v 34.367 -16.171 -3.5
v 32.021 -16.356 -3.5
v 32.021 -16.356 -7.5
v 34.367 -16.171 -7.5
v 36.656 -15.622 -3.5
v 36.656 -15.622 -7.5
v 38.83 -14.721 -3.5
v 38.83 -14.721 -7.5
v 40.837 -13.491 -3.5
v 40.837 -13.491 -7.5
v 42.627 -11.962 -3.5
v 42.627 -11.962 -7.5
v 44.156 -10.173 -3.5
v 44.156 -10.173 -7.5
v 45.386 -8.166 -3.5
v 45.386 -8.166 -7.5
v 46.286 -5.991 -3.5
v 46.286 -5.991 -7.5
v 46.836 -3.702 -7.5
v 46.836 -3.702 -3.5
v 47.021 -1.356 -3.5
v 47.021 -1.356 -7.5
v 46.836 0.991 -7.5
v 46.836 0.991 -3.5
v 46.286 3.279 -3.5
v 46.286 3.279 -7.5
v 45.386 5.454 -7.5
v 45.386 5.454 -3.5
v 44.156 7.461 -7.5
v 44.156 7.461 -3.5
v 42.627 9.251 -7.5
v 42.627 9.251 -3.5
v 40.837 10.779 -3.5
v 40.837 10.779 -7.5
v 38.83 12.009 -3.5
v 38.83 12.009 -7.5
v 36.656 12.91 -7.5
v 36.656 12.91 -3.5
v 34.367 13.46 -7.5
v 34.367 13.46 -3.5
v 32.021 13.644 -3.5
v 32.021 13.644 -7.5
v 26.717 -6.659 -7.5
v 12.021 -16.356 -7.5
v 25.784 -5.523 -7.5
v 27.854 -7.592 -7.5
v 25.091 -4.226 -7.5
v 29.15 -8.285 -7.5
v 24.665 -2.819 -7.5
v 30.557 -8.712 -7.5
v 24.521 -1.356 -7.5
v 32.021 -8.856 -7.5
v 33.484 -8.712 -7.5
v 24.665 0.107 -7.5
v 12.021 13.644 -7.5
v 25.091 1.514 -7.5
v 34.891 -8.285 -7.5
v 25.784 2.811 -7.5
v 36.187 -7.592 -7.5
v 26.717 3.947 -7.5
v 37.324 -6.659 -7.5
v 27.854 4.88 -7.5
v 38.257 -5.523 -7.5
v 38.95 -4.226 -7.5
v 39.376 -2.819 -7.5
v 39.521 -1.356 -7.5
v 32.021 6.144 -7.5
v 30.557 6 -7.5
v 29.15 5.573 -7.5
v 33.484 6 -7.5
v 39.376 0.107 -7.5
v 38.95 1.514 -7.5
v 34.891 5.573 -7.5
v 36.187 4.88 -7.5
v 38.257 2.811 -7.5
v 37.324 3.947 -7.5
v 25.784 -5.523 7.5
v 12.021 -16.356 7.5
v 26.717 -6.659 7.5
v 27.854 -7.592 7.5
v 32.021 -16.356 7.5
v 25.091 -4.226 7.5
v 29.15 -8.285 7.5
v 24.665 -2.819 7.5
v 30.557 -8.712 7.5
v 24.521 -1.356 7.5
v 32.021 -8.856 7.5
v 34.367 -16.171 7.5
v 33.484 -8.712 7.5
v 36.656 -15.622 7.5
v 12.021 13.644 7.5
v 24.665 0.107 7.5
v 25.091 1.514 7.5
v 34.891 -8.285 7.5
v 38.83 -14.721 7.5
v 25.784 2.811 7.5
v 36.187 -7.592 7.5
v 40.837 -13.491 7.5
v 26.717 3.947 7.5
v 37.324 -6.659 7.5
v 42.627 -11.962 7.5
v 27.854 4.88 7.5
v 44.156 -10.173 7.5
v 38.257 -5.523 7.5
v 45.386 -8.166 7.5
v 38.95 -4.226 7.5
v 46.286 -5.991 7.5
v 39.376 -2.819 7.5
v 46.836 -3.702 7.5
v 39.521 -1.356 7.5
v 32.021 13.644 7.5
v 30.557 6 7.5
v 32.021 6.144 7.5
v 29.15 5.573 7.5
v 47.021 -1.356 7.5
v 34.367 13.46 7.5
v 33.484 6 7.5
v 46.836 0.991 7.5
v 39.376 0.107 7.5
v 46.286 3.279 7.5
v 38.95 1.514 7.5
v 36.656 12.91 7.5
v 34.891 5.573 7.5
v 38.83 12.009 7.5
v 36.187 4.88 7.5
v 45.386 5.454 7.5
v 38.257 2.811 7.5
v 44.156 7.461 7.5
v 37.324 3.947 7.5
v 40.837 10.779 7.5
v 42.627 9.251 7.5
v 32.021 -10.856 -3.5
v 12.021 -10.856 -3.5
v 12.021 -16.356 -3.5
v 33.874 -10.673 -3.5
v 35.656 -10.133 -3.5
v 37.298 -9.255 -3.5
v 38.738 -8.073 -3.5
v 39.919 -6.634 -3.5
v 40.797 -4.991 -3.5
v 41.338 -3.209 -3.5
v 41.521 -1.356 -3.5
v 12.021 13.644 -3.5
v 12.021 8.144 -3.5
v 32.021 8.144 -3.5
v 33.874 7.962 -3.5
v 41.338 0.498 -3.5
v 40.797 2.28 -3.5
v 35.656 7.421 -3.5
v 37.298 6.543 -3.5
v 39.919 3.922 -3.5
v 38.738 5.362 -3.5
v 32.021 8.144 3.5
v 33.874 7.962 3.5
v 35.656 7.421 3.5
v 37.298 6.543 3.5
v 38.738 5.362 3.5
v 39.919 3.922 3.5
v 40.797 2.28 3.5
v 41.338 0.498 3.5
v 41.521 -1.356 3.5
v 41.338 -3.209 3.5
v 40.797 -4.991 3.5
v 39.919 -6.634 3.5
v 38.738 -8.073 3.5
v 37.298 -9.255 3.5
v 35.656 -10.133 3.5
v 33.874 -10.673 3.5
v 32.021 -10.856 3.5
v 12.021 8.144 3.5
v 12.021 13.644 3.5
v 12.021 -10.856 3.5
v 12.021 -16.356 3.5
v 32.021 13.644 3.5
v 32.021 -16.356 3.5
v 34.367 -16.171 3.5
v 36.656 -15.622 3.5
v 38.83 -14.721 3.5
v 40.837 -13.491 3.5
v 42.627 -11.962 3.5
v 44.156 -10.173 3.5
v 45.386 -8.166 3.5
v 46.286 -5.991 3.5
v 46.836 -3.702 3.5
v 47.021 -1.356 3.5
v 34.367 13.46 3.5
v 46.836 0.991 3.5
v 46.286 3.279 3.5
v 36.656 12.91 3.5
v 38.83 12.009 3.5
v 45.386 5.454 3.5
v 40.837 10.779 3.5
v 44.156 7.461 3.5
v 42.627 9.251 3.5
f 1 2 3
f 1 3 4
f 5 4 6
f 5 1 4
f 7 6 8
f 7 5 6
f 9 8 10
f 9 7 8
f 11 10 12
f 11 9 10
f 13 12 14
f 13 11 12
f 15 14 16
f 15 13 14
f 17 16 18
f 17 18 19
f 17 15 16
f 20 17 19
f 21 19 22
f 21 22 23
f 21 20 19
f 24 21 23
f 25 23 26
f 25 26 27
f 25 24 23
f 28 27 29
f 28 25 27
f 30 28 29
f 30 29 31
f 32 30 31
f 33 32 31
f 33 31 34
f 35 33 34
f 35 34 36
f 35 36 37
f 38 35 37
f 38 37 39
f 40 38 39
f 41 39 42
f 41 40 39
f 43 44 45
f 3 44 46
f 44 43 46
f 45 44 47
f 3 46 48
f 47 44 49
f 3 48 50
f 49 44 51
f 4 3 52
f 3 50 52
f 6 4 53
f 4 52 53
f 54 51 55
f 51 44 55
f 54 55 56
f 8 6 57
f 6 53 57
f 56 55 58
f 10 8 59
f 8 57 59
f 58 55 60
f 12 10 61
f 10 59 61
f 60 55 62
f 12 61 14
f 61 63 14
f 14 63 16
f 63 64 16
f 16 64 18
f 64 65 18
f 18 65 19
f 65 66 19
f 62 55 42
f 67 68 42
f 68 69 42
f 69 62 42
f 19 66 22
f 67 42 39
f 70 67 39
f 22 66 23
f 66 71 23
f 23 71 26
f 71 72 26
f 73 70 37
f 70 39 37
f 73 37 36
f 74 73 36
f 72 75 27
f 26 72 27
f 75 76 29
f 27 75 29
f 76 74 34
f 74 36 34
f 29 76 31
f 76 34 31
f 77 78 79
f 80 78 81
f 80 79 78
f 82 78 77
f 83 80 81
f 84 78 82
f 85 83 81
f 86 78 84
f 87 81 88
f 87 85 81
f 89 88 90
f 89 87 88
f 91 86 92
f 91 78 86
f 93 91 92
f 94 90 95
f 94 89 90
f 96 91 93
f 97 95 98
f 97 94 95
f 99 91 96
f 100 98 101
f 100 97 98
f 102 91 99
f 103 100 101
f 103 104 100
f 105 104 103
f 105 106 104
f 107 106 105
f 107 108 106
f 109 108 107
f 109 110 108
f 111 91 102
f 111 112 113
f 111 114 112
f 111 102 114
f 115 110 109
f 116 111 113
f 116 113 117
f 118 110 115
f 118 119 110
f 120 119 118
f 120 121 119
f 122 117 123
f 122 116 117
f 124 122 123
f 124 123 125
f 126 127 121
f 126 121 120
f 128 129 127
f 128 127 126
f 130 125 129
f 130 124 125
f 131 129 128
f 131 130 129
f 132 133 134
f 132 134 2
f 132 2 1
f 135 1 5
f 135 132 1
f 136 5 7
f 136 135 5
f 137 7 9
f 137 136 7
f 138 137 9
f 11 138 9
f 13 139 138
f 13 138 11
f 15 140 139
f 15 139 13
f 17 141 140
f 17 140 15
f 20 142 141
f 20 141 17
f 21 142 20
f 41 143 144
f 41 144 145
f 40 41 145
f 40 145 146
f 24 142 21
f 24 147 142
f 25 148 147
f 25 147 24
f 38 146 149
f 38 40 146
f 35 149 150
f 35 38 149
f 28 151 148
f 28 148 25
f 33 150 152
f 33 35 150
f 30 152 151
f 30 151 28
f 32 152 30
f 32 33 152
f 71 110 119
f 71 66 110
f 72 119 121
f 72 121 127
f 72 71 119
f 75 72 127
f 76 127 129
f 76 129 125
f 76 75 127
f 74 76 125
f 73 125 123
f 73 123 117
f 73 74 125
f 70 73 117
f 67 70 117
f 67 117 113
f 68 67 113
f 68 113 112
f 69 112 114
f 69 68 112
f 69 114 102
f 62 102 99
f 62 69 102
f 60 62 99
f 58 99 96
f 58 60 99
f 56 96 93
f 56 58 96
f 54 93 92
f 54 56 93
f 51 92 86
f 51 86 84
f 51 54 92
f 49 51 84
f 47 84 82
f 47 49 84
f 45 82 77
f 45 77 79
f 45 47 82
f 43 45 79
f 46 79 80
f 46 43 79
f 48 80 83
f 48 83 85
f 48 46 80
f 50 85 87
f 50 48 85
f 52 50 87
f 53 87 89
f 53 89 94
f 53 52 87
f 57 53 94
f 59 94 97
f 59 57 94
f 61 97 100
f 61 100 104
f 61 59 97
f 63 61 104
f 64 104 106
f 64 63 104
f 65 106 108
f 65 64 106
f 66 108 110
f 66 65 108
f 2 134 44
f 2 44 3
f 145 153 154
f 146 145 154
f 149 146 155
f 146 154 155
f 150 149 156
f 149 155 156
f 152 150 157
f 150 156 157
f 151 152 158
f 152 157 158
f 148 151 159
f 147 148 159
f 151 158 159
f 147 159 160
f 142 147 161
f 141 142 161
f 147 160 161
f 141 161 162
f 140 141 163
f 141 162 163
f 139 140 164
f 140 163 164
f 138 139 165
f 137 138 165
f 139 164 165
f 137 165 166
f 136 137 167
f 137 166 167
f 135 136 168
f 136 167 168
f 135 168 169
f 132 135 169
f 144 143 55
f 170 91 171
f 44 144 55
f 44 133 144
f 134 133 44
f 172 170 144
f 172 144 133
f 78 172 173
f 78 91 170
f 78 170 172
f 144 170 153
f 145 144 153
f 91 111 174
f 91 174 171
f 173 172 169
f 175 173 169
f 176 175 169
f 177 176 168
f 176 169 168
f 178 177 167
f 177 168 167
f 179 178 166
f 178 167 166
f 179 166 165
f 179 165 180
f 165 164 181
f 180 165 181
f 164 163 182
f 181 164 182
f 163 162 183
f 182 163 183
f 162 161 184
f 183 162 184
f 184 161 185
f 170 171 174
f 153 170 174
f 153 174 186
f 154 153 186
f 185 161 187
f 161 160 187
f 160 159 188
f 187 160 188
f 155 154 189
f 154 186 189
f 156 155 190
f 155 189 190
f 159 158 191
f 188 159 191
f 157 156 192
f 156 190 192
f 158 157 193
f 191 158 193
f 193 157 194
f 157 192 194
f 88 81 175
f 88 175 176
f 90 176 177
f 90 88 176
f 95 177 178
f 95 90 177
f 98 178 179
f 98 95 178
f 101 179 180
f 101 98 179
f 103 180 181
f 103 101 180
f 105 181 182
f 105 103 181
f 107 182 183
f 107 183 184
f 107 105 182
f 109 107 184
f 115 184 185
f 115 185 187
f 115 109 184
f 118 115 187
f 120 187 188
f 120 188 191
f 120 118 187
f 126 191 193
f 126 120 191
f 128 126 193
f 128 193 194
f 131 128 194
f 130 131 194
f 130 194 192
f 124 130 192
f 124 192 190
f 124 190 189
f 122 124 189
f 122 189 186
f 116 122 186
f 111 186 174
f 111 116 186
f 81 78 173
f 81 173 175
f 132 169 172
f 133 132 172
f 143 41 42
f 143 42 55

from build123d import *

# Parameters (mm, degrees)
F0_R     = 7.5
F1_DEPTH = 7.5
F2_DEPTH = 3.5


with BuildPart() as f1:
    # F0 (on Top) → F1 (new body, symmetric)
    with BuildSketch(Plane.XY):
        with BuildLine():
            Line((32.020504, 8.144187), (12.020504, 8.144187))
            Line((12.020504, 8.144187), (12.020504, -10.855813))
            Line((12.020504, -10.855813), (32.020504, -10.855813))
            ThreePointArc((32.020504, -10.855813), (41.520504, -1.355813), (32.020504, 8.144187))
        make_face()
        with Locations((32.020504, -1.355813)):
            Circle(F0_R, mode=Mode.SUBTRACT)
        with BuildLine():
            Line((32.020504, 13.644187), (12.020504, 13.644187))
            Line((12.020504, 13.644187), (12.020504, 8.144187))
            Line((12.020504, 8.144187), (32.020504, 8.144187))
            ThreePointArc((32.020504, 8.144187), (41.520504, -1.355813), (32.020504, -10.855813))
            Line((32.020504, -10.855813), (12.020504, -10.855813))
            Line((12.020504, -10.855813), (12.020504, -16.355813))
            Line((12.020504, -16.355813), (32.020504, -16.355813))
            ThreePointArc((32.020504, -16.355813), (47.020504, -1.355813), (32.020504, 13.644187))
        make_face()
    extrude(amount=F1_DEPTH, both=True)

    # F0 (on Top) → F2 (cut, symmetric)
    with BuildSketch(Plane.XY):
        with BuildLine():
            Line((32.020504, 13.644187), (12.020504, 13.644187))
            Line((12.020504, 13.644187), (12.020504, 8.144187))
            Line((12.020504, 8.144187), (32.020504, 8.144187))
            ThreePointArc((32.020504, 8.144187), (41.520504, -1.355813), (32.020504, -10.855813))
            Line((32.020504, -10.855813), (12.020504, -10.855813))
            Line((12.020504, -10.855813), (12.020504, -16.355813))
            Line((12.020504, -16.355813), (32.020504, -16.355813))
            ThreePointArc((32.020504, -16.355813), (47.020504, -1.355813), (32.020504, 13.644187))
        make_face()
    extrude(amount=F2_DEPTH, both=True, mode=Mode.SUBTRACT)


solid = f1.part
